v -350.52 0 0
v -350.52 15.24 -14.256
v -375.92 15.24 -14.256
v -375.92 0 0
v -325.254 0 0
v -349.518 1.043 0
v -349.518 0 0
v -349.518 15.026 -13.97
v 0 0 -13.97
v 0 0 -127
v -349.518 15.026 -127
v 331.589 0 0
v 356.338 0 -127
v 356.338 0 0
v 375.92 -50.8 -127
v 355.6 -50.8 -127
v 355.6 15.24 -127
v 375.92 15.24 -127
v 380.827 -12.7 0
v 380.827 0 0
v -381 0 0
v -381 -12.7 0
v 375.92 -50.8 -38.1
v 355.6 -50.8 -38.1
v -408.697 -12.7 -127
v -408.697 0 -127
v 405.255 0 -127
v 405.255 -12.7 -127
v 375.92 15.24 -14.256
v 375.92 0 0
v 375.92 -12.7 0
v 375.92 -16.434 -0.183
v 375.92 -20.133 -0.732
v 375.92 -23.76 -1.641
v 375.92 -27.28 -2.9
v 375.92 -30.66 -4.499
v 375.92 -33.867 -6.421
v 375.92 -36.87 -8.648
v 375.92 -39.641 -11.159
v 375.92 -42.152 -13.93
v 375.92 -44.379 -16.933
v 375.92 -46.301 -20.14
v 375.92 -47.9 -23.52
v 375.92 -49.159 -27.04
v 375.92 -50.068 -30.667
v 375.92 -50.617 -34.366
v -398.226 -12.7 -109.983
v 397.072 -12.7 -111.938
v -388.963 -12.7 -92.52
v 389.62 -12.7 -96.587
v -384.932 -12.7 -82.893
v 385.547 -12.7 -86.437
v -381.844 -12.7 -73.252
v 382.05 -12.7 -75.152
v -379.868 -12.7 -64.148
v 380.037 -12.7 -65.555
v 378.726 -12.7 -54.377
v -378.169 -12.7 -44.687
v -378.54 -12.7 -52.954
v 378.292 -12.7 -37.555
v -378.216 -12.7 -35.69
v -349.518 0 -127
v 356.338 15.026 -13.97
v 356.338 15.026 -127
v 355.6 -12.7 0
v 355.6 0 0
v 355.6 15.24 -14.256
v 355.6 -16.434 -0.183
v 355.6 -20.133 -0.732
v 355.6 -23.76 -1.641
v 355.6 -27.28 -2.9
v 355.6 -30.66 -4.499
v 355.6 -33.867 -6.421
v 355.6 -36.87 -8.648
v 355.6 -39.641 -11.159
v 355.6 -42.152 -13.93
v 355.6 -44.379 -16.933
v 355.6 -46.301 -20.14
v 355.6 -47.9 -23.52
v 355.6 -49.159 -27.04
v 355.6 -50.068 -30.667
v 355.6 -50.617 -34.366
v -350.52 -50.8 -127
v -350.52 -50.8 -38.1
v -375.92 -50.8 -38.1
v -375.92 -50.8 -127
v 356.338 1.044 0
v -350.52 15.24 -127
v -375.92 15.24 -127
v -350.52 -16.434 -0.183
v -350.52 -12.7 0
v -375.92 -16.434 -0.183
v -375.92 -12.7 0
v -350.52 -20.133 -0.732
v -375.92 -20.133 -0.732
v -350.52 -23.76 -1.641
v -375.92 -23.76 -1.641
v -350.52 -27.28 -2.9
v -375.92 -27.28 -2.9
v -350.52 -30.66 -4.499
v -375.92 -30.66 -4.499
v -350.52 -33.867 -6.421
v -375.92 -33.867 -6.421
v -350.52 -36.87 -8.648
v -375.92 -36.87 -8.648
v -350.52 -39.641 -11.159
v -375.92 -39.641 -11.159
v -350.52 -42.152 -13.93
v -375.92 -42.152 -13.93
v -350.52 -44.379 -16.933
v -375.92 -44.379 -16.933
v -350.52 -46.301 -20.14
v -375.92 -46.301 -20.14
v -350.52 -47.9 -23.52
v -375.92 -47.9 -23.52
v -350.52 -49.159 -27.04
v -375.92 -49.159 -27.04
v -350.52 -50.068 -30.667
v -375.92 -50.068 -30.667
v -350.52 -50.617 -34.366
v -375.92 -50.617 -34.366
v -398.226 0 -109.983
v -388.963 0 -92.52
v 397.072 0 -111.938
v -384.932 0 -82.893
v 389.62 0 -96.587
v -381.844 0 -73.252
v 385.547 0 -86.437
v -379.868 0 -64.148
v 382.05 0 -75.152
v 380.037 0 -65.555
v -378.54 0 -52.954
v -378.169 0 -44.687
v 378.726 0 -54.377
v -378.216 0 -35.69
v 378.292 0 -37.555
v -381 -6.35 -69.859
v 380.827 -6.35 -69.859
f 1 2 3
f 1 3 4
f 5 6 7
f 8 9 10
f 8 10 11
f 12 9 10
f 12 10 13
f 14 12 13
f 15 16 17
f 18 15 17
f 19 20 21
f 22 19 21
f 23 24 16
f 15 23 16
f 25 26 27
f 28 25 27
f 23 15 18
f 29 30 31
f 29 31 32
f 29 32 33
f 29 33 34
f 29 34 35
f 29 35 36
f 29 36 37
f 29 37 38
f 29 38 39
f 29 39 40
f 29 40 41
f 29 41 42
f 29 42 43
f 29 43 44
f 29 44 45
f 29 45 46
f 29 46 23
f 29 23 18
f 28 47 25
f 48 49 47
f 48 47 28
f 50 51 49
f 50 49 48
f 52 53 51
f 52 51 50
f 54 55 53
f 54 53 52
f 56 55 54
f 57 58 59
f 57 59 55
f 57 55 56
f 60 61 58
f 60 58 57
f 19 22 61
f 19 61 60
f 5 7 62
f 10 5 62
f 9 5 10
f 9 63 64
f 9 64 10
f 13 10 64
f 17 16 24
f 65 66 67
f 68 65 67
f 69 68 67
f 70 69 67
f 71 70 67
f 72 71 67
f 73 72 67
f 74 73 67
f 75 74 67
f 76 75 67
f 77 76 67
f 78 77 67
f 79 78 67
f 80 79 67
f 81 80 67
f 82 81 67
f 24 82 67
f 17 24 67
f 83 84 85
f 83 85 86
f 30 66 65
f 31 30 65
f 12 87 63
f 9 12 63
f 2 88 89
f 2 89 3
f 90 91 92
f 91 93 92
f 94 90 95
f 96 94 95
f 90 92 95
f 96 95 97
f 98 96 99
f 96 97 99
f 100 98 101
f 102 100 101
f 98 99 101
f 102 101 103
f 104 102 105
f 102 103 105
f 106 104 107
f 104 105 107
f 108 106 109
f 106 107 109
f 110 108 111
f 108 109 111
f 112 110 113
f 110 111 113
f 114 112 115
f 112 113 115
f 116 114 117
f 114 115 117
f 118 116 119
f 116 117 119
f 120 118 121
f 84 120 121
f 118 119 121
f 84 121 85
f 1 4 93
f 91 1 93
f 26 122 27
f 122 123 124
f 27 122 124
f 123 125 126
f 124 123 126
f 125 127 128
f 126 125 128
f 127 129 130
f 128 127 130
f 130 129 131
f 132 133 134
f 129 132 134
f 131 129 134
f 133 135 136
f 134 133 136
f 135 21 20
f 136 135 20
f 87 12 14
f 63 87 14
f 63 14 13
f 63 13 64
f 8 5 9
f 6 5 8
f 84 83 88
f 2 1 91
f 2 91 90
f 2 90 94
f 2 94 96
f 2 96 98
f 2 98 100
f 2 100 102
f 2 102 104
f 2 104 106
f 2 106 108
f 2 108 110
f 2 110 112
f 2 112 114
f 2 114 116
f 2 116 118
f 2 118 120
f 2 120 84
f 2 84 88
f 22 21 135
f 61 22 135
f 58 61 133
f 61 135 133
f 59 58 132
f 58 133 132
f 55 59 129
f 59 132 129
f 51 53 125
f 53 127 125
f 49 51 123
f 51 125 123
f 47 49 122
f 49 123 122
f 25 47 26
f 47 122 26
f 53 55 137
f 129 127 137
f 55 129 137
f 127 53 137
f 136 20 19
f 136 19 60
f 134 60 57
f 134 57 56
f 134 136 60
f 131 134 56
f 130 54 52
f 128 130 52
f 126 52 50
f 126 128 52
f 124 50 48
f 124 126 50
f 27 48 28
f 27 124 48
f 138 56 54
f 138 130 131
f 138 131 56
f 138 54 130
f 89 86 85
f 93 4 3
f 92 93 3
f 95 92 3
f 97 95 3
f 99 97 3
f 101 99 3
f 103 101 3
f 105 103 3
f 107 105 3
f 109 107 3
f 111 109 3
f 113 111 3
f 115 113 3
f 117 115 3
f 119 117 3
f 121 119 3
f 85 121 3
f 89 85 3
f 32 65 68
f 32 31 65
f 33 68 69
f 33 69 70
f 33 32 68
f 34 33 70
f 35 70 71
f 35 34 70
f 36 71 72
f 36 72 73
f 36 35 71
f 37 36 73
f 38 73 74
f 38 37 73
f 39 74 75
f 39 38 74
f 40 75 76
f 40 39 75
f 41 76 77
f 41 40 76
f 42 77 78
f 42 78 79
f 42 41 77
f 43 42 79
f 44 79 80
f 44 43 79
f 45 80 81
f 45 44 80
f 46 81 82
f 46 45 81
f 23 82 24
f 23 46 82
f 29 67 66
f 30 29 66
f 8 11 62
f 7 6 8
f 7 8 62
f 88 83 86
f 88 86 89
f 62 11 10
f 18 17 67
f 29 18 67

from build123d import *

# Parameters (mm, degrees)
F2_DEPTH  = 12.7
F3_DEPTH  = 375.92
F4_DEPTH  = 355.6
F5_DEPTH  = 751.84
F6_DEPTH  = 726.44
F8_DEPTH  = 127
F9_SIZE   = 13.97
F9_2_SIZE = 13.97
F10_R     = 38.1
F10_2_R   = 38.1


with BuildPart() as f2:
    # F0 (on Front) → F2 (new body)
    with BuildSketch(Plane.XZ):
        with BuildLine():
            Line((380.8272553887, 0), (0, 0))
            Line((0, 0), (-381, 0))
            add(Edge.make_bspline(
                [(-381, 0), (-378.5180144942, -24.1278339391), (-373.6845366605, -71.2463261626), (-397.2052409969, -108.7811267769), (-408.6969792843, -127)],
                knots=[0, 0, 0, 0, 0.5119270914, 1, 1, 1, 1], degree=3))
            Line((-408.6969792843, -127), (405.2553772926, -127))
            add(Edge.make_bspline(
                [(380.8272553887, 0), (378.6026539617, -24.075771659), (374.2937220743, -70.8487324495), (395.1306170121, -108.7180910096), (405.2553772926, -127)],
                knots=[0, 0, 0, 0, 0.5146236499, 1, 1, 1, 1], degree=3))
        make_face()
    extrude(amount=F2_DEPTH)


with BuildPart() as f3:
    # F1 (on Right) → F3 (new body)
    with BuildSketch(Plane.YZ):
        Polygon((15.24, -14.2560294469), (0, 0), (-50.8, 0), (-50.8, -75.6412135187), (-50.8, -127), (15.24, -127), (15.24, -75.6412135187), align=None)
    extrude(amount=F3_DEPTH)

    # F4 (cut): a face of the model
    f4_faces = [f3.faces().sort_by_distance(p)[0] for p in [
        (0, -18.1466325136, -64.2708991879),
    ]]
    extrude(f4_faces, amount=-F4_DEPTH, mode=Mode.SUBTRACT)


with BuildPart() as f5:
    # F5 (new): a face of the model
    f5_faces = [f3.part.faces().sort_by_distance(p)[0] for p in [
        (375.92, -18.1466325136, -64.2708991879),
    ]]
    extrude(f5_faces, amount=-F5_DEPTH)

    # F6 (cut): a face of the model
    f6_faces = [f3.part.faces().sort_by_distance(p)[0] for p in [
        (375.92, -18.1466325136, -64.2708991879),
    ]]
    extrude(f6_faces, amount=-F6_DEPTH, mode=Mode.SUBTRACT)

    # F10#2
    f10_2_edges = [f5.edges().sort_by_distance(p)[0] for p in [
        (-363.22, -50.8, 0),
    ]]
    fillet(f10_2_edges, radius=F10_2_R)


with BuildPart() as f8:
    # F7 (on Top) → F8 (new body)
    with BuildSketch(Plane.XY):
        Polygon((-349.5178818703, 0), (0, 0), (-349.5178818703, 15.0260068476), align=None)
    extrude(amount=-F8_DEPTH)

    # F9
    f9_edges = [f8.edges().sort_by_distance(p)[0] for p in [
        (-174.758941, 7.513003, 0),
    ]]
    chamfer(f9_edges, length=F9_SIZE)


with BuildPart() as f8b:
    # F7 (on Top) → F8, piece 2 (new body)
    with BuildSketch(Plane.XY):
        Polygon((356.3379347324, 15.0260068476), (0, 0), (356.3379347324, 0), align=None)
    extrude(amount=-F8_DEPTH)

    # F9#2
    f9_2_edges = [f8b.edges().sort_by_distance(p)[0] for p in [
        (178.168967, 7.513003, 0),
    ]]
    chamfer(f9_2_edges, length=F9_2_SIZE)


with BuildPart() as f3_1:
    add(f3.part)

    # F10
    f10_edges = [f3_1.edges().sort_by_distance(p)[0] for p in [
        (365.76, -50.8, 0),
    ]]
    fillet(f10_edges, radius=F10_R)


solid = Compound([f2.part, f5.part, f8.part, f8b.part, f3_1.part])
